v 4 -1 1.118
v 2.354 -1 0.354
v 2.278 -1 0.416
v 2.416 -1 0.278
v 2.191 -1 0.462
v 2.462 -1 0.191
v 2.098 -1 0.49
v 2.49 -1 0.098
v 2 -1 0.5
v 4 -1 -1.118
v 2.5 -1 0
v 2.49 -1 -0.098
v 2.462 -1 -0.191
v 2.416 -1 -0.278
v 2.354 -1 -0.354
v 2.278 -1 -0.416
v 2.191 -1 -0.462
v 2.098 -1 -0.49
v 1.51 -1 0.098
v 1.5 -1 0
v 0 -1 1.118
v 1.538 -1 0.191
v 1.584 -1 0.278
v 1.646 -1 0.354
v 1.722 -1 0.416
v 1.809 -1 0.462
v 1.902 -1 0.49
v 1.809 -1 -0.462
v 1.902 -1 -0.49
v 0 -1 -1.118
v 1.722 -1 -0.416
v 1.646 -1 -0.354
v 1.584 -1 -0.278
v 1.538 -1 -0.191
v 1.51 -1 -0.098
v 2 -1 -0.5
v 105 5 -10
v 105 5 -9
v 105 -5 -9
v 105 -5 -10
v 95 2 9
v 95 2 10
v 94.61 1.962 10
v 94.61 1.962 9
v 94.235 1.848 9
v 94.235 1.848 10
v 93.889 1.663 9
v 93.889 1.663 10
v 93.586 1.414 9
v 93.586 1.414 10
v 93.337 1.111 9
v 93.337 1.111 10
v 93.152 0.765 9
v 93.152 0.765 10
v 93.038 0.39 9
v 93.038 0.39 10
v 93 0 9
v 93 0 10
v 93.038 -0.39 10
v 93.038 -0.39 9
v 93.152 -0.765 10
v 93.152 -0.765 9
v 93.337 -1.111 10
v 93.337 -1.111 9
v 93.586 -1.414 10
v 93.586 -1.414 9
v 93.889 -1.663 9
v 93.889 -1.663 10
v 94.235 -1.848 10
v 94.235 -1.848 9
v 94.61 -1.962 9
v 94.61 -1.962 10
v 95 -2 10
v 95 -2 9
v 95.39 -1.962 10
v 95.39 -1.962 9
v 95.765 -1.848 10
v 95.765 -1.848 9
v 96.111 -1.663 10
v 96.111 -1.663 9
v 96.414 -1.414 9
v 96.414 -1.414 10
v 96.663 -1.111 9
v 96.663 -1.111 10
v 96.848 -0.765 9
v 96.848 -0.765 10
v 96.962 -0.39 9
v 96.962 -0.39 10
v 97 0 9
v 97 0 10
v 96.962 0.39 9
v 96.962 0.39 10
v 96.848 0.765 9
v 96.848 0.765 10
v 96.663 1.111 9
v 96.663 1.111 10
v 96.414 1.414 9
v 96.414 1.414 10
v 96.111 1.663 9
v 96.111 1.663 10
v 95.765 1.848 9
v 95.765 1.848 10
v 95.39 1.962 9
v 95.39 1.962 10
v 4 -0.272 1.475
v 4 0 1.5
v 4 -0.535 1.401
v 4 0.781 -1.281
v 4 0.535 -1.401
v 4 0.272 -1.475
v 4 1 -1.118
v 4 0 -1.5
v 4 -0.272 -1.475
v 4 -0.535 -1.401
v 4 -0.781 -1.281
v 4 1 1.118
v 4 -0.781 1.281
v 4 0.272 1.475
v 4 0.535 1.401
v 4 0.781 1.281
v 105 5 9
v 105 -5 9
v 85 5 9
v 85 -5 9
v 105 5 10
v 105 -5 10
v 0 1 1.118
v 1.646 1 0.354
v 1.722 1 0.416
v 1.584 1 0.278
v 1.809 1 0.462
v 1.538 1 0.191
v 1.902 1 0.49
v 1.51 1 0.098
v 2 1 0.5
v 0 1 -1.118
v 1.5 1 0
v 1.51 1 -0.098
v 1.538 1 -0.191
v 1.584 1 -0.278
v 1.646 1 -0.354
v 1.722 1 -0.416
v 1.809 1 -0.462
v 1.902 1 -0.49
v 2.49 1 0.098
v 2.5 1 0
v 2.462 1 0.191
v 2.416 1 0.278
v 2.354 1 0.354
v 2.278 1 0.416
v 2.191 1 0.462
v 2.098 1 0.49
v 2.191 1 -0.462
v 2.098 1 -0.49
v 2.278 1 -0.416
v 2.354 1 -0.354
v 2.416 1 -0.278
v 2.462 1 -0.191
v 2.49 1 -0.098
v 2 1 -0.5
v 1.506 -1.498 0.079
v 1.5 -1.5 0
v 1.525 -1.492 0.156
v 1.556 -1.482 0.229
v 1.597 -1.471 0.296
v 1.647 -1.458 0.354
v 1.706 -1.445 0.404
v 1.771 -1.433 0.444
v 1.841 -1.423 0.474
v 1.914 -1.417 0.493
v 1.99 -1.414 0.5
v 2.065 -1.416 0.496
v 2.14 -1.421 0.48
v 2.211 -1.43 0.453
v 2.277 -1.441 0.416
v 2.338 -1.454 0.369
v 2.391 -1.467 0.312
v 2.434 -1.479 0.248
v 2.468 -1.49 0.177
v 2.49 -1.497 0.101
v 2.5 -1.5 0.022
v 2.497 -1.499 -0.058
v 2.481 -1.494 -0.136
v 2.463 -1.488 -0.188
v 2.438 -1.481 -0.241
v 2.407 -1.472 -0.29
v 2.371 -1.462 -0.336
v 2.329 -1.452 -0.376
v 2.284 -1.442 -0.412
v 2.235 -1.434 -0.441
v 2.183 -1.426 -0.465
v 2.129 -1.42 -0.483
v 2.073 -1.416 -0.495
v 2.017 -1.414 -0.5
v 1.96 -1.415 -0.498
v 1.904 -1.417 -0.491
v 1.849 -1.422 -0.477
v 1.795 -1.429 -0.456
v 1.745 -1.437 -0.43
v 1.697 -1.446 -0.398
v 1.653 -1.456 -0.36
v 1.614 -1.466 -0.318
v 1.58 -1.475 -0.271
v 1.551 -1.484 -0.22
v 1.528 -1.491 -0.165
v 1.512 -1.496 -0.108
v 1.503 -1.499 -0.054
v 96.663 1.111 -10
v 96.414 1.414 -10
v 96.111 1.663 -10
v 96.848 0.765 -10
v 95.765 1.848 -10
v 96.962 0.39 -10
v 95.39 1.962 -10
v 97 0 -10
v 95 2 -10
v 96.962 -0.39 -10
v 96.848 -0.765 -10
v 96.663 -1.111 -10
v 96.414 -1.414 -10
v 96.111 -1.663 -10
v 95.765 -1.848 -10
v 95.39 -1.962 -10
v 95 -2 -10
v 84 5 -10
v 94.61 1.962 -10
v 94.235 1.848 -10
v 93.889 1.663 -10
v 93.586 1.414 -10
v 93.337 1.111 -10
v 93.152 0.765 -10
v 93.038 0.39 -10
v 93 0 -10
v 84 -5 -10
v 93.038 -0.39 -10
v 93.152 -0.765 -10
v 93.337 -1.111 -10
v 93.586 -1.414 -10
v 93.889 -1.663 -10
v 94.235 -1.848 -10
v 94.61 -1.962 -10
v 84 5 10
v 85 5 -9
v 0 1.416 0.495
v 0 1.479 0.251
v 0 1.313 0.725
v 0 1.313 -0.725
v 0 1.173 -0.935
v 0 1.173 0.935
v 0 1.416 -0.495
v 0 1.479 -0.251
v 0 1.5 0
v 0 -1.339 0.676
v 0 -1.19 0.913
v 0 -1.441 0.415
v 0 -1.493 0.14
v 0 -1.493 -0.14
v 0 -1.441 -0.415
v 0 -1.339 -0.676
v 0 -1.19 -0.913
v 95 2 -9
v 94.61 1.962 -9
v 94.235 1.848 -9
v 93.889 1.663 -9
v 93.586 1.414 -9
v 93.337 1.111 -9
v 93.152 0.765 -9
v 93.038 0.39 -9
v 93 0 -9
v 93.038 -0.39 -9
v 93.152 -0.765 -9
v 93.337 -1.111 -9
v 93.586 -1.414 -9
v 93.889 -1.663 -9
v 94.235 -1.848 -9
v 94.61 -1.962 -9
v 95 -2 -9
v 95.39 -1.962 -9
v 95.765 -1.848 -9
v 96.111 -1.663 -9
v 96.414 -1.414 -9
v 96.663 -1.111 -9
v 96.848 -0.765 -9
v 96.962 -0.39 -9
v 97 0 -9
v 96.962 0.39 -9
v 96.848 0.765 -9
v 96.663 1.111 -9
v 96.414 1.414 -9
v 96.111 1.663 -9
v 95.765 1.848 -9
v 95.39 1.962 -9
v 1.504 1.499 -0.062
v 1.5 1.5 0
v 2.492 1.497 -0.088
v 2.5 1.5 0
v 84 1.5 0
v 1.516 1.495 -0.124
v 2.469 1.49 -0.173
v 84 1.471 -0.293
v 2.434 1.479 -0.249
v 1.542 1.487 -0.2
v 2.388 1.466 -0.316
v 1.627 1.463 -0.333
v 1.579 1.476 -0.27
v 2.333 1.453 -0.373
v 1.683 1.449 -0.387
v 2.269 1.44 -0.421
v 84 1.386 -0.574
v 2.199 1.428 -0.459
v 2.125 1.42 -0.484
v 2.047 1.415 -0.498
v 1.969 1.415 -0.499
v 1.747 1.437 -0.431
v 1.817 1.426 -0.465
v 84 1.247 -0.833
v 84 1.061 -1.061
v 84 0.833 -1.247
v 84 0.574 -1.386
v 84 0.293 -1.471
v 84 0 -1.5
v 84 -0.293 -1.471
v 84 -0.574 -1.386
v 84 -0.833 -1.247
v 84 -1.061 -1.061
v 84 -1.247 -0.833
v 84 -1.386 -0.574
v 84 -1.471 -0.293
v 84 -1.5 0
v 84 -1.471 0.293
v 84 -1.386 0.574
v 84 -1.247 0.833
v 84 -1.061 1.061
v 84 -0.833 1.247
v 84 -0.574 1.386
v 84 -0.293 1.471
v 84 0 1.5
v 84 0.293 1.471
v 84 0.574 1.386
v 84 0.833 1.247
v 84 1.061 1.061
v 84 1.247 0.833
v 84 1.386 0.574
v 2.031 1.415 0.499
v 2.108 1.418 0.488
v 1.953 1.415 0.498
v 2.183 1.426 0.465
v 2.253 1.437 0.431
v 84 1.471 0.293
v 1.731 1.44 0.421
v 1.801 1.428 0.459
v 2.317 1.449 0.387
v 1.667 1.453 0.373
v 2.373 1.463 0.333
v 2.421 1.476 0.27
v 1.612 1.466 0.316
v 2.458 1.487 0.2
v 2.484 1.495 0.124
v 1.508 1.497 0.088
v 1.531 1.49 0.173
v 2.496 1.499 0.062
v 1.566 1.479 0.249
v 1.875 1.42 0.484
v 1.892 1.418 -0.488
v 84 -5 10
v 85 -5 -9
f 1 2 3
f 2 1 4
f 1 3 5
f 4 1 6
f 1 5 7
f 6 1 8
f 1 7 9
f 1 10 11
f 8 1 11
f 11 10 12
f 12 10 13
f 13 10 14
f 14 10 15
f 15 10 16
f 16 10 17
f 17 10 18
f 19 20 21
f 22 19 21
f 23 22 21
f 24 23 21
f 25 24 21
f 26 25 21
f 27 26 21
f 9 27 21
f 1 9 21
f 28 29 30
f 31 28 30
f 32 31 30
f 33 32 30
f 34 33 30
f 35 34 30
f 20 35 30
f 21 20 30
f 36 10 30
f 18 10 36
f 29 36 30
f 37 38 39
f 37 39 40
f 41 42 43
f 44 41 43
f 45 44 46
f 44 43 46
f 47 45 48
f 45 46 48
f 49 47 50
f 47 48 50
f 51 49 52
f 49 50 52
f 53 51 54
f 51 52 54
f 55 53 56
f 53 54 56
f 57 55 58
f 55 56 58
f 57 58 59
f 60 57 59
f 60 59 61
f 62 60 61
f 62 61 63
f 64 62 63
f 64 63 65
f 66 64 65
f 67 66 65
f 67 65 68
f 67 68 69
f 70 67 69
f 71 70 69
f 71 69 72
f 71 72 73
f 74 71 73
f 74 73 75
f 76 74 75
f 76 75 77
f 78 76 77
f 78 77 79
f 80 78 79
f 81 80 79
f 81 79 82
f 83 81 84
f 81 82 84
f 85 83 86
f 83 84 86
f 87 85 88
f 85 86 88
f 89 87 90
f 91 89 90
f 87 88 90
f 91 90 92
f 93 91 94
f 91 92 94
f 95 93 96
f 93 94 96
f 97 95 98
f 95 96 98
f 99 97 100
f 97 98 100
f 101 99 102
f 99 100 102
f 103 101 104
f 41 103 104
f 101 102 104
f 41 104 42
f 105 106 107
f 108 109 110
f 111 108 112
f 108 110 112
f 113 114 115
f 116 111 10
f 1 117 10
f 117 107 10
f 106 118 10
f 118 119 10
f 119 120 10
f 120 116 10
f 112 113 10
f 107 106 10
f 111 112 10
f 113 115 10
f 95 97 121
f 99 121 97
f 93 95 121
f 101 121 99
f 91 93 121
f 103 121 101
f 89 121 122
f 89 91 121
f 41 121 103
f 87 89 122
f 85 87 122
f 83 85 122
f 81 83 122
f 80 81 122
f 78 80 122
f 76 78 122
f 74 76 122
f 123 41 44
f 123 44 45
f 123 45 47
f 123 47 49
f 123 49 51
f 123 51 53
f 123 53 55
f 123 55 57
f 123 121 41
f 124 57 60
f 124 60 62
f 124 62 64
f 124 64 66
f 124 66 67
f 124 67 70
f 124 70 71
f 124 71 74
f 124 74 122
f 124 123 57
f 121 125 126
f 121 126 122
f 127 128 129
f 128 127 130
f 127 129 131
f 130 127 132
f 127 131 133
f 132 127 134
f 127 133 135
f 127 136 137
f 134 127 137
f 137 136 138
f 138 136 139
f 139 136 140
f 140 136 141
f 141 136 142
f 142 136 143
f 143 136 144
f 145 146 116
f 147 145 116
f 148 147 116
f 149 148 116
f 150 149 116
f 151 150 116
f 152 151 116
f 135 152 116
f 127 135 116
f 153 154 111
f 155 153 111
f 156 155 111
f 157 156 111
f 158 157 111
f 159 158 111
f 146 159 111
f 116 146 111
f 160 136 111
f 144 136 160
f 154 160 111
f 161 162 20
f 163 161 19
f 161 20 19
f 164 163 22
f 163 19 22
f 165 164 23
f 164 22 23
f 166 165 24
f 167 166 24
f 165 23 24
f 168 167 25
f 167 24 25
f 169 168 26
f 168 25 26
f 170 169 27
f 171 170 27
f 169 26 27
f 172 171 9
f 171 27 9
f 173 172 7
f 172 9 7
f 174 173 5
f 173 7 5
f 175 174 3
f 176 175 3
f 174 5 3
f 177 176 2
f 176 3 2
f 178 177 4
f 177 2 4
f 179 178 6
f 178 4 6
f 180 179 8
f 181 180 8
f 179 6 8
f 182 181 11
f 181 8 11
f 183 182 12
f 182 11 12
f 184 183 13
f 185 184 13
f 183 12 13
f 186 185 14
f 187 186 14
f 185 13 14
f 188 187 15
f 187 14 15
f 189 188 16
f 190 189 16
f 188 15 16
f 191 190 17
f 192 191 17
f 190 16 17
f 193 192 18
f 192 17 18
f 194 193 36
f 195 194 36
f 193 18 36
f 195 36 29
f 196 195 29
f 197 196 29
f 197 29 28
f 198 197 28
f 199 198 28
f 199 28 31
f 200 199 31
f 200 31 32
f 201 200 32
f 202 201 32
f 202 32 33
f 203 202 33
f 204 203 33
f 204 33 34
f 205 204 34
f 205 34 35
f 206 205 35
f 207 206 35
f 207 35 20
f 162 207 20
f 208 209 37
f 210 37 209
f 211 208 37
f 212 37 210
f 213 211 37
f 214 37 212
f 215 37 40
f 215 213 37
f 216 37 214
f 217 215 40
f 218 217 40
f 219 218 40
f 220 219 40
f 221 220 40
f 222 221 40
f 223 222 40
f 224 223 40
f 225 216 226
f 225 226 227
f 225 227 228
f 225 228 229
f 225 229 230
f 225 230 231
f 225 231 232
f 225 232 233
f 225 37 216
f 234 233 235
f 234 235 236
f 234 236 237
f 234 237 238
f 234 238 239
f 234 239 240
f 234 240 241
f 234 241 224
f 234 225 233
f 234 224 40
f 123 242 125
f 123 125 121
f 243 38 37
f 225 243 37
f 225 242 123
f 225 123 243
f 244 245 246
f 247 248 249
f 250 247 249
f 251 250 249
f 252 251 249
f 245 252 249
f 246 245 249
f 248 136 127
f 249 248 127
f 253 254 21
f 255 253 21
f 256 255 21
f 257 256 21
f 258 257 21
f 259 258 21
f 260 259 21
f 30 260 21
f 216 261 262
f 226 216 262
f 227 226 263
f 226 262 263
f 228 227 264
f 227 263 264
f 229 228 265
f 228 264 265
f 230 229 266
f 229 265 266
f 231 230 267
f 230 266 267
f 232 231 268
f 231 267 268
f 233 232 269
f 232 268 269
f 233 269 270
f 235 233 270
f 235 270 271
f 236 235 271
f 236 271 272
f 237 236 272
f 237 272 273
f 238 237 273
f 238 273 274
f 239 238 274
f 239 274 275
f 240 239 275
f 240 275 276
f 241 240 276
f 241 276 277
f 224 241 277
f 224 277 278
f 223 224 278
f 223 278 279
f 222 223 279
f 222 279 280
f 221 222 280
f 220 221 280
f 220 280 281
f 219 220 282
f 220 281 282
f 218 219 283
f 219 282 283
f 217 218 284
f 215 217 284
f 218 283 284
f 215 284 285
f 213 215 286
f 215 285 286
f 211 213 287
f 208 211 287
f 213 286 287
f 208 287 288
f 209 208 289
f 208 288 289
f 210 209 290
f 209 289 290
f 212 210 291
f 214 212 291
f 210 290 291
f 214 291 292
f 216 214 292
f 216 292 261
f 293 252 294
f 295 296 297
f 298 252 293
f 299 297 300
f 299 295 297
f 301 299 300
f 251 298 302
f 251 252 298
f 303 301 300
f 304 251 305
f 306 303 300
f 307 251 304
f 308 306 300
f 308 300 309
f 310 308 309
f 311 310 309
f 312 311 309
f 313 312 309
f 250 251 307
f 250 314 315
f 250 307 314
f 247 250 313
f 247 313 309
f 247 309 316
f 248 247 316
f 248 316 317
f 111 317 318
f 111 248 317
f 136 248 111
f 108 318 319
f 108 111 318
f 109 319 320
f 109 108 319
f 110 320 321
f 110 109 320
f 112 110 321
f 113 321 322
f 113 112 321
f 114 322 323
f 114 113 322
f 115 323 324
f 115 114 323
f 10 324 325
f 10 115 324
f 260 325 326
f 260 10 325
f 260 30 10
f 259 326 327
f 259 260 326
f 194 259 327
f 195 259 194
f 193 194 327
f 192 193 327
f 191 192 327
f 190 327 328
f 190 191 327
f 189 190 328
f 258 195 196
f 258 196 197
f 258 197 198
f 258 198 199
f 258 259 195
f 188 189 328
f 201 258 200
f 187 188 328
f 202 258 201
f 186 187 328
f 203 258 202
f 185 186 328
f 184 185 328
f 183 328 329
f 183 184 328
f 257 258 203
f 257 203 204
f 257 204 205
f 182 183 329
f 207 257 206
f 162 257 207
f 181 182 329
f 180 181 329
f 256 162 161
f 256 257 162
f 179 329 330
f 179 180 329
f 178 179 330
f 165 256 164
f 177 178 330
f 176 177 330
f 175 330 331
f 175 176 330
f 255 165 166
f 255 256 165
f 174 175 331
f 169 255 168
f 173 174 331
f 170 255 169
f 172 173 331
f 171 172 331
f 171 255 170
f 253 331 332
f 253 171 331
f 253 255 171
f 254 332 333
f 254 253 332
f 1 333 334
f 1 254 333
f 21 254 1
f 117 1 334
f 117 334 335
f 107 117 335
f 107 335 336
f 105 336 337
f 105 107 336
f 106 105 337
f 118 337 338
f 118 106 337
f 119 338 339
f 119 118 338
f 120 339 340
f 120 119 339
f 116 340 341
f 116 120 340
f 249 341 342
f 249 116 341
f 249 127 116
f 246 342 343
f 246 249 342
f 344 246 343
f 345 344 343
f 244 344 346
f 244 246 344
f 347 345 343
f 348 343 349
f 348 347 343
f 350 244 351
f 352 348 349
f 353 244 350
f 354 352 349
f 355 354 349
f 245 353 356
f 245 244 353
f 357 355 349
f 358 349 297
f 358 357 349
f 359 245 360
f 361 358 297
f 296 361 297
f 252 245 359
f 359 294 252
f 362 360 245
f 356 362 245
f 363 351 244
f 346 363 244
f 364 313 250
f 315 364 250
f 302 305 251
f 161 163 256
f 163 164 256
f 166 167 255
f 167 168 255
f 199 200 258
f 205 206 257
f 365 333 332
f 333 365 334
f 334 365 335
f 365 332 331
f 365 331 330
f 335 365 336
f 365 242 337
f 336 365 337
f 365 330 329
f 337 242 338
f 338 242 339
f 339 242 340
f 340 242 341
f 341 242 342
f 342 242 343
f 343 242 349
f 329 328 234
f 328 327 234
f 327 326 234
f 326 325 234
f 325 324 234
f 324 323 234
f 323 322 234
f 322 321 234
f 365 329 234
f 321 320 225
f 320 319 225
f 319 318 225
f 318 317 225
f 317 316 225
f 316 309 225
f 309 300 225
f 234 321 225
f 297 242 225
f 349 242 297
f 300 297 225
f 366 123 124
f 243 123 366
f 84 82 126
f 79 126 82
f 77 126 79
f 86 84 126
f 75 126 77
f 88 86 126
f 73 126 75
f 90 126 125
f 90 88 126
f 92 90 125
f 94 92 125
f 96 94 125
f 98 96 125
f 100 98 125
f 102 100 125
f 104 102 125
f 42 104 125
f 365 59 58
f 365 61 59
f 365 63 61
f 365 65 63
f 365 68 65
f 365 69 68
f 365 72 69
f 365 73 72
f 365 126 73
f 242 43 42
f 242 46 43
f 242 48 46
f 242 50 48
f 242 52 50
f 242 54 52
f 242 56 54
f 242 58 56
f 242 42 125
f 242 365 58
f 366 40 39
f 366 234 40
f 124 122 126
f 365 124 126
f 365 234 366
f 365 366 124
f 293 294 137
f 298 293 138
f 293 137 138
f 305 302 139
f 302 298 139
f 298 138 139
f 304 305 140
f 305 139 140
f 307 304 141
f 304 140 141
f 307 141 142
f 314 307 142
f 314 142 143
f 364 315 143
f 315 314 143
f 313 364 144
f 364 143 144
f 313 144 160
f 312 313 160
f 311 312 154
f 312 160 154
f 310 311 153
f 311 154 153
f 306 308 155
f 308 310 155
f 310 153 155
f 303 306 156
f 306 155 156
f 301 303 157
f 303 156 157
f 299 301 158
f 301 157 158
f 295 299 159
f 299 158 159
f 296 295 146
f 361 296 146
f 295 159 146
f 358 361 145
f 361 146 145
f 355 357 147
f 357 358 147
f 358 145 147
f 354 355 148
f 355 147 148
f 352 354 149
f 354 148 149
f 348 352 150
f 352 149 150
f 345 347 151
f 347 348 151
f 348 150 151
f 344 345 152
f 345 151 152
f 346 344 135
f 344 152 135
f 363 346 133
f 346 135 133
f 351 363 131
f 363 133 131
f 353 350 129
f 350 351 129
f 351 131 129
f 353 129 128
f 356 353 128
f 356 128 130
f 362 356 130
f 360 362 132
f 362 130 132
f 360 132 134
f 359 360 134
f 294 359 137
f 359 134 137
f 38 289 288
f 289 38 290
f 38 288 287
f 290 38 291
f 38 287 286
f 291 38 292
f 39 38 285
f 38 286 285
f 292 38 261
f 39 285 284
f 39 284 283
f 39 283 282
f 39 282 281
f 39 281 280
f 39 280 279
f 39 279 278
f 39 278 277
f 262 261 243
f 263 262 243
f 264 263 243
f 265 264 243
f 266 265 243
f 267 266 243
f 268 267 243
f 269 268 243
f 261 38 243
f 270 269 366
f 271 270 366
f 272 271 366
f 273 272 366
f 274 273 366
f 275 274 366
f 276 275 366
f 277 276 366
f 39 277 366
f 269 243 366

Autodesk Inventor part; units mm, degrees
ref_plane "YZ Plane" through (0, 0, 0) normal (1, 0, 0) x (0, 1, 0)
ref_plane "XZ Plane" through (0, 0, 0) normal (0, 1, 0) x (-1, 0, 0)
ref_plane "XY Plane" through (0, 0, 0) normal (0, 0, 1) x (1, 0, 0)
sketch "草图1" plane through (0, 0, 0) normal (1, 0, 0) x (0, 1, 0)
  circle A0 centre (0, 0) radius 1.5
  dimension "杆直径" = 3
extrude "拉伸1" add sketch "草图1" along normal blind 84
sketch "草图2" plane through (84, 0, 0) normal (1, 0, 0) x (0, 0, -1)
  line L0 (10, -5) -> (-10, -5)
  line L1 (-10, -5) -> (-10, 5)
  line L2 (-10, 5) -> (10, 5)
  line L3 (10, 5) -> (10, -5)
  line L4 (10, -5) -> (-10, 5) construction
  line L5 (-10, -5) -> (10, 5) construction
  point P0 (0, 0)
  dimension "框长" = 20
  dimension "框宽" = 10
extrude "拉伸2" add sketch "草图2" along normal blind 1
sketch "草图3" plane through (85, 0, 0) normal (1, 0, 0) x (0, 0, -1)
  line L0 (-10, -5) -> (10, -5) projected
  line L1 (10, -5) -> (10, 5) projected
  line L2 (10, 5) -> (-10, 5) projected
  line L3 (-10, 5) -> (-10, -5) projected
  line L4 (-10, 5) -> (-9, 5)
  line L5 (-9, 5) -> (-9, -5)
  line L6 (10, 5) -> (9, 5)
  line L7 (9, 5) -> (9, -5)
  point P0 (0, 0)
  dimension "d7" = 1
  dimension "d8" = 1
extrude "拉伸3" add sketch "草图3" along normal blind 20 contours L3 L2 L5 L0 | L7 L2 L1 L0
hole "孔1" at (95, 0, -10) direction (0, 0, 1) diameter 4 end through all
sketch "草图5" plane through (0, 0, 0) normal (0, 0, 1) x (1, 0, 0)
  line L0 (0, 1.5) -> (0, -1.5) projected
  line L1 (0, 1.5) -> (84, 1.5) projected
  line L2 (0, -1.5) -> (84, -1.5) projected
  line L3 (0, 1) -> (4, 1)
  line L4 (4, 1) -> (4, -1)
  line L5 (4, -1) -> (0, -1)
  line L6 (0, 0) -> (4, 0) construction
  point P0 (2, 0)
  dimension "d21" = 4
  dimension "宽度" = 2
extrude "拉伸4" cut sketch "草图5" along normal through all both and the other way through all
sketch "草图6" plane through (0, 0, 0) normal (0, 1, 0) x (-1, 0, 0)
  line L0 (-4, 1.5) -> (-84, 1.5) projected
  line L1 (-4, -1.5) -> (-84, -1.5) projected
  line L2 (0, 1.118) -> (0, -1.118) projected
  line L3 (-4, -1.118) -> (-4, 1.118) projected
  circle A0 centre (-2, 0) radius 0.5
  point P0 (0, 0)
  dimension "位置1" = 2
  dimension "位置2" = 1.5
  dimension "销孔径" = 1
extrude "拉伸5" cut sketch "草图6" along normal mid plane 10
properties part number "顶杆" material "木材(桦木)"
